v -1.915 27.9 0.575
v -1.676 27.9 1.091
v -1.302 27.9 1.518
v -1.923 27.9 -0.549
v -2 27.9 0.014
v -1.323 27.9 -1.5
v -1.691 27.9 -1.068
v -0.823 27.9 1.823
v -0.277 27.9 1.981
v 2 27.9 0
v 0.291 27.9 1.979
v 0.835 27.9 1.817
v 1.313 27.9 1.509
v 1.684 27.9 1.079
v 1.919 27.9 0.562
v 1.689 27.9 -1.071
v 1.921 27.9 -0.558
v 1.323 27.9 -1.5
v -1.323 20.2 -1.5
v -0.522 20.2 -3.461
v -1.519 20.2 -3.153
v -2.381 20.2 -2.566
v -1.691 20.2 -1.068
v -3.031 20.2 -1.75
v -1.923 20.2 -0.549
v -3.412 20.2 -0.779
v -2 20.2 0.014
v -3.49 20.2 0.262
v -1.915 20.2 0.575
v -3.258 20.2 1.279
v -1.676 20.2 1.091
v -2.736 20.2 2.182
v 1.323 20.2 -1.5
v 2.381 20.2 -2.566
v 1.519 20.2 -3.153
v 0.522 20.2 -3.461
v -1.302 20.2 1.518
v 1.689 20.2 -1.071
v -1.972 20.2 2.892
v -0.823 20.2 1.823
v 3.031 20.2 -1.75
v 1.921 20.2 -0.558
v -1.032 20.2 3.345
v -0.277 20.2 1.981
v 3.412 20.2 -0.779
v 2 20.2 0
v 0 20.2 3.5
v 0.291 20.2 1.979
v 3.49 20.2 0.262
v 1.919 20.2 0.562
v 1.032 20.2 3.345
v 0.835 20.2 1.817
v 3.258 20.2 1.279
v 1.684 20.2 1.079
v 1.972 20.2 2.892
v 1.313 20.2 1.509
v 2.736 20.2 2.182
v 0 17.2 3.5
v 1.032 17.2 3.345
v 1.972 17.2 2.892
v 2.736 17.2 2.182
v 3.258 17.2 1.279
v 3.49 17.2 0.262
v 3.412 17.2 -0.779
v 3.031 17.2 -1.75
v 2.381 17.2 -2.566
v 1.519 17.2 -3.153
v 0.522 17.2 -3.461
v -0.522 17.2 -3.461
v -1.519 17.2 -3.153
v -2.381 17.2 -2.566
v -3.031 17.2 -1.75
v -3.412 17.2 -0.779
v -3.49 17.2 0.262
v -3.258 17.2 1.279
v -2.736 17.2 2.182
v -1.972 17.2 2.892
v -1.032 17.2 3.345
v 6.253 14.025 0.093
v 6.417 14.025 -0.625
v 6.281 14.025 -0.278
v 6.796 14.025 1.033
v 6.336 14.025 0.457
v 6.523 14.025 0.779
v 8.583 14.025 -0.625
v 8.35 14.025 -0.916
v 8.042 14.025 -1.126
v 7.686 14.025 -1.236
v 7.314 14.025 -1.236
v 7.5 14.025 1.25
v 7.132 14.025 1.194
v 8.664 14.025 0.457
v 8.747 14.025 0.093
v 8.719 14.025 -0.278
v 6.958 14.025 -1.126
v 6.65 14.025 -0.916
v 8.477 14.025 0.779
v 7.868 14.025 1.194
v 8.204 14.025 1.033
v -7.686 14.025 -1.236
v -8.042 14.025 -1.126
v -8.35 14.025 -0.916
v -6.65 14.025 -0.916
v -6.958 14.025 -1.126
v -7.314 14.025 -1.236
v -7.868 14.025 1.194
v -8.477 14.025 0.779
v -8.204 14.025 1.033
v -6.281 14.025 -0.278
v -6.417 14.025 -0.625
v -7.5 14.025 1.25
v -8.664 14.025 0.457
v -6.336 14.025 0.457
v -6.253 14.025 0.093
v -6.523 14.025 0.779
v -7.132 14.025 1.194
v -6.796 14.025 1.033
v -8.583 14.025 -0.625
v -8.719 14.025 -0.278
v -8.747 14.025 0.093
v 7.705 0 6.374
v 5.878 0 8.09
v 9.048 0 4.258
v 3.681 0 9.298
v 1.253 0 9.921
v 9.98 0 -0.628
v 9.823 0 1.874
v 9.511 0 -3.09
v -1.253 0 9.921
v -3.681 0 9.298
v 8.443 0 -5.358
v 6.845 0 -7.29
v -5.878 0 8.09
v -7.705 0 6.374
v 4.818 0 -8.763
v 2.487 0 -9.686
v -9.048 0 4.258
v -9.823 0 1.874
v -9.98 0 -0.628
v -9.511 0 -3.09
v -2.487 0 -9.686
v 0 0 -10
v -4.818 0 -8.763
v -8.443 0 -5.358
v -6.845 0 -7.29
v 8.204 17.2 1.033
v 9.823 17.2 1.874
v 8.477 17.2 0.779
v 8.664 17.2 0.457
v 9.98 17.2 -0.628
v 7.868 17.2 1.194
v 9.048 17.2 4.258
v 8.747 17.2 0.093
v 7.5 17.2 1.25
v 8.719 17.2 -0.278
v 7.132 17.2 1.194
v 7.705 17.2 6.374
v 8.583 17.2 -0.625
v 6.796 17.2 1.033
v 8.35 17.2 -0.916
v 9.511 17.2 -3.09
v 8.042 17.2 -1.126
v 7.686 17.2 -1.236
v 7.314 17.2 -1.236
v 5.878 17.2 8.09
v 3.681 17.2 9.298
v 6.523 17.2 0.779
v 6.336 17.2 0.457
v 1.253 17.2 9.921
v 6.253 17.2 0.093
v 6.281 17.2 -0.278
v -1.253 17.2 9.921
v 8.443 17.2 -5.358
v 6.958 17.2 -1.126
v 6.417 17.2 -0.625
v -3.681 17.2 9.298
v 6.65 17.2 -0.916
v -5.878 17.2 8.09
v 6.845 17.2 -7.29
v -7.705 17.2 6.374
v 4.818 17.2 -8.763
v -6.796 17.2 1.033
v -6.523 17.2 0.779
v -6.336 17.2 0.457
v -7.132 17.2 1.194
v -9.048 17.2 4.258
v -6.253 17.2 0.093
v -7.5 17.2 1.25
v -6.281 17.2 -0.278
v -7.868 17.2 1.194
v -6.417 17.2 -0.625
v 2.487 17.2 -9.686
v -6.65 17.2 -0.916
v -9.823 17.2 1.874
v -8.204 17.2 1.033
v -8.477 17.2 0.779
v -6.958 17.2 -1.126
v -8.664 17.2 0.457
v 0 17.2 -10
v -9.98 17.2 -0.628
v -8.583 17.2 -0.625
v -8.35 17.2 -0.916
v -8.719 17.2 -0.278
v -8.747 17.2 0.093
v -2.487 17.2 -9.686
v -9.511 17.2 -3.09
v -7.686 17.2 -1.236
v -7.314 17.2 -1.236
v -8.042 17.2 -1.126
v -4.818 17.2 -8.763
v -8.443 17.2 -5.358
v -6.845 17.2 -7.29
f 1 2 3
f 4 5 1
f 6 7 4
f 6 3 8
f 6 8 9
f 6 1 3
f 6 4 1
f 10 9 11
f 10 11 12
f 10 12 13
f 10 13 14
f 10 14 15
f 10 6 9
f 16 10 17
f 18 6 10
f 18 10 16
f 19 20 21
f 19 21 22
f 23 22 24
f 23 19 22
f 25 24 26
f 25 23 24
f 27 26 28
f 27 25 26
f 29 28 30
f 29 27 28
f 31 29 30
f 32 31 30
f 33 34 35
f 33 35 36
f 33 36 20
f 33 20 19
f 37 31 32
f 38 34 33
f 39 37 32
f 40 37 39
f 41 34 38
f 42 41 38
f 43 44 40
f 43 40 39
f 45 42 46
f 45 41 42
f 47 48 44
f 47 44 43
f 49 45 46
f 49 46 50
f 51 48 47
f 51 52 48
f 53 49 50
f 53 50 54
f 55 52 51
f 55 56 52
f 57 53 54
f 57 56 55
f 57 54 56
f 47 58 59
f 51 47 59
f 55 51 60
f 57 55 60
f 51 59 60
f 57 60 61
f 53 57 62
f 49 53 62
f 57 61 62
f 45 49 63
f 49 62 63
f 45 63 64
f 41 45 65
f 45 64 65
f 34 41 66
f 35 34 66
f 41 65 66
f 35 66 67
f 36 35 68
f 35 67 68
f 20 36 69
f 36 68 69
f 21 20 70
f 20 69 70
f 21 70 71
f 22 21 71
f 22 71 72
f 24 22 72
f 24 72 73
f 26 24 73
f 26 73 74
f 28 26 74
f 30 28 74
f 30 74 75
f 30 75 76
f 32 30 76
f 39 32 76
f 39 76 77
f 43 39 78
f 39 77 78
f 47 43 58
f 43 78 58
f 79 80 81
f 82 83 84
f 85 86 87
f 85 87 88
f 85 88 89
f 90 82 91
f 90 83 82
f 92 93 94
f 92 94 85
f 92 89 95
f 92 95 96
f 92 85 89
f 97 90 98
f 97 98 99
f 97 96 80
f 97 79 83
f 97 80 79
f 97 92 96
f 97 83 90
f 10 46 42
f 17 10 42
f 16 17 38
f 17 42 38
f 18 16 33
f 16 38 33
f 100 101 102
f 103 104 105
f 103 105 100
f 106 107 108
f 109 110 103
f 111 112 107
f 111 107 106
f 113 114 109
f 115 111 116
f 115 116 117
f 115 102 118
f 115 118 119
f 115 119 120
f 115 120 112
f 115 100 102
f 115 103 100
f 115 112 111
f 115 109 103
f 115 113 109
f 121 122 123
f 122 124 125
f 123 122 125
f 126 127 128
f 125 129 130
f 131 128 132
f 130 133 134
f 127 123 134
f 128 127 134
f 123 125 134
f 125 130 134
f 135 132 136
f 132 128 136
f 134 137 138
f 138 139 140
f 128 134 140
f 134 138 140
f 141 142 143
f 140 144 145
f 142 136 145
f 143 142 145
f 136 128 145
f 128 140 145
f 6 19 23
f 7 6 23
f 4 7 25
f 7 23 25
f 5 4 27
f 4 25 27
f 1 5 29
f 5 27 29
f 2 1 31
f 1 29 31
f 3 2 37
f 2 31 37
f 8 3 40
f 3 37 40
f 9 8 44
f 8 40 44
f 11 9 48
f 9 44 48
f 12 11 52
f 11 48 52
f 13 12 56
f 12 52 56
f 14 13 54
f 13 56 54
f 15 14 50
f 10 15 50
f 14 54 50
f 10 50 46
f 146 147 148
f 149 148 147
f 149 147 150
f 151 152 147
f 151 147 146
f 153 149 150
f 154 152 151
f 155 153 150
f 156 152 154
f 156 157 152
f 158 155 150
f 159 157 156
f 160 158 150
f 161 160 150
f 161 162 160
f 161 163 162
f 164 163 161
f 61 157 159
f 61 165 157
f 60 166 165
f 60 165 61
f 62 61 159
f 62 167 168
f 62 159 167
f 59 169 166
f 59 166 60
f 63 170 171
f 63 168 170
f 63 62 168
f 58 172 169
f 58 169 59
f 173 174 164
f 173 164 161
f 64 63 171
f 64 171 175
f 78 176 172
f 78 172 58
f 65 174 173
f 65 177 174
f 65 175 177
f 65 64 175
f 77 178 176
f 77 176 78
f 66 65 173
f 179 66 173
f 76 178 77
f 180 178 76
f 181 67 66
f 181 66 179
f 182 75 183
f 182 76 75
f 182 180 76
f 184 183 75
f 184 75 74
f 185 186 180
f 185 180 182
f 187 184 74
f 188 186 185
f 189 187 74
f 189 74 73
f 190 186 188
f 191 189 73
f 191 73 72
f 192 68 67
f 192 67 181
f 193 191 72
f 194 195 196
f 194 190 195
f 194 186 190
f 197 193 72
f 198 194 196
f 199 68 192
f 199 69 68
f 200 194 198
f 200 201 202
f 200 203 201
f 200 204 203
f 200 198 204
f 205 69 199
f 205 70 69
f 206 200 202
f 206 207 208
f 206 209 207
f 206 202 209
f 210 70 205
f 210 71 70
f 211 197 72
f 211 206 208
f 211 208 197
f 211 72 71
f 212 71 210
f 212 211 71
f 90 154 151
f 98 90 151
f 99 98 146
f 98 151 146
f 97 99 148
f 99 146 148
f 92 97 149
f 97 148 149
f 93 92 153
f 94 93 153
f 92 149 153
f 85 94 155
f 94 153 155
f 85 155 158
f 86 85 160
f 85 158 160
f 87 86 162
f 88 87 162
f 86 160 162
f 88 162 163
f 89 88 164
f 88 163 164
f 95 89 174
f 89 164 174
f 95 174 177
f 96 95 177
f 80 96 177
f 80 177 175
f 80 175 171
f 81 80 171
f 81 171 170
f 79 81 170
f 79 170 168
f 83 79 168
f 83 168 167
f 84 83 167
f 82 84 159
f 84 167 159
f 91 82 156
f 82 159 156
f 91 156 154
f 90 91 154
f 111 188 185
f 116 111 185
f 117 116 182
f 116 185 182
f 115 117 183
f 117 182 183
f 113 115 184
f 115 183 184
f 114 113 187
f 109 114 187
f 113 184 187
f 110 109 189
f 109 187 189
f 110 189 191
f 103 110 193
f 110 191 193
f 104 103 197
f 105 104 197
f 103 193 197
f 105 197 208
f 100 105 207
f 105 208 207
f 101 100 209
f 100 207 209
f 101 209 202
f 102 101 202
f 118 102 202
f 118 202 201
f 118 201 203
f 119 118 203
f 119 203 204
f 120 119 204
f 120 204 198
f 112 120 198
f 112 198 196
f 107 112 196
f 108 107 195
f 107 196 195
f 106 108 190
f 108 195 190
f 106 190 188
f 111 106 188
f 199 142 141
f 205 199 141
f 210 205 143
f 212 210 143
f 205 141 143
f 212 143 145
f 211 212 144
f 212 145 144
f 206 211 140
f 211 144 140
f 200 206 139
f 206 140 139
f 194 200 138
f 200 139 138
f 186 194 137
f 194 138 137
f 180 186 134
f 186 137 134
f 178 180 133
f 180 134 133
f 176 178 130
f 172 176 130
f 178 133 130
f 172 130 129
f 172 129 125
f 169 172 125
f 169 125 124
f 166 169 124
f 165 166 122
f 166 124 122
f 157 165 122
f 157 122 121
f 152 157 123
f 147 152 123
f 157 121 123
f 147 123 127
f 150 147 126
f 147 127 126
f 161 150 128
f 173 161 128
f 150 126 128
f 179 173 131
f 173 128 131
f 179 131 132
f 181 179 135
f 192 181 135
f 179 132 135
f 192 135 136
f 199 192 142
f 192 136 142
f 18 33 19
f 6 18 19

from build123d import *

# Parameters (mm, degrees)
SKETCH1_R           = 10
BOSS_EXTRUDE1_DEPTH = 17.2
SKETCH2_R           = 3.5
BOSS_EXTRUDE2_DEPTH = 3
BOSS_EXTRUDE3_DEPTH = 7.7
SKETCH4_R           = 1.25
CUT_EXTRUDE1_DEPTH  = 3.175


with BuildPart() as part:
    # Sketch1 → Boss-Extrude1 (new body)
    with BuildSketch(Plane(origin=(0, 0, 0), x_dir=(1, 0, 0), z_dir=(0, 1, 0))):
        with Locations(Location((0, 0, 0), (0, 0, 90))):
            Circle(SKETCH1_R)
    extrude(amount=BOSS_EXTRUDE1_DEPTH)

    # Sketch2 → Boss-Extrude2 (add)
    with BuildSketch(Plane(origin=(0, 17.2, 0), x_dir=(1, 0, 0), z_dir=(0, 1, 0))):
        with Locations(Location((0, 0, 0), (0, 0, 270))):
            Circle(SKETCH2_R)
    extrude(amount=BOSS_EXTRUDE2_DEPTH)

    # Sketch3 → Boss-Extrude3 (add)
    with BuildSketch(Plane(origin=(0, 20.2, 0), x_dir=(1, 0, 0), z_dir=(0, 1, 0))):
        with BuildLine():
            Line((1.322875656, 1.5), (-1.322875656, 1.5))
            ThreePointArc((-1.322875656, 1.5), (-0.822875656, -1.822875656), (2, 0))
            ThreePointArc((2, 0), (1.822875656, 0.822875656), (1.322875656, 1.5))
        make_face()
    extrude(amount=BOSS_EXTRUDE3_DEPTH)

    # Sketch4 → Cut-Extrude1 (cut)
    with BuildSketch(Plane(origin=(0, 17.2, 0), x_dir=(1, 0, 0), z_dir=(0, 1, 0))):
        with Locations(Location((-7.5, 0, 0), (0, 0, 270))):
            Circle(SKETCH4_R)
        with Locations(Location((7.5, 0, 0), (0, 0, 270))):
            Circle(SKETCH4_R)
    extrude(amount=-CUT_EXTRUDE1_DEPTH, mode=Mode.SUBTRACT)


solid = part.part
